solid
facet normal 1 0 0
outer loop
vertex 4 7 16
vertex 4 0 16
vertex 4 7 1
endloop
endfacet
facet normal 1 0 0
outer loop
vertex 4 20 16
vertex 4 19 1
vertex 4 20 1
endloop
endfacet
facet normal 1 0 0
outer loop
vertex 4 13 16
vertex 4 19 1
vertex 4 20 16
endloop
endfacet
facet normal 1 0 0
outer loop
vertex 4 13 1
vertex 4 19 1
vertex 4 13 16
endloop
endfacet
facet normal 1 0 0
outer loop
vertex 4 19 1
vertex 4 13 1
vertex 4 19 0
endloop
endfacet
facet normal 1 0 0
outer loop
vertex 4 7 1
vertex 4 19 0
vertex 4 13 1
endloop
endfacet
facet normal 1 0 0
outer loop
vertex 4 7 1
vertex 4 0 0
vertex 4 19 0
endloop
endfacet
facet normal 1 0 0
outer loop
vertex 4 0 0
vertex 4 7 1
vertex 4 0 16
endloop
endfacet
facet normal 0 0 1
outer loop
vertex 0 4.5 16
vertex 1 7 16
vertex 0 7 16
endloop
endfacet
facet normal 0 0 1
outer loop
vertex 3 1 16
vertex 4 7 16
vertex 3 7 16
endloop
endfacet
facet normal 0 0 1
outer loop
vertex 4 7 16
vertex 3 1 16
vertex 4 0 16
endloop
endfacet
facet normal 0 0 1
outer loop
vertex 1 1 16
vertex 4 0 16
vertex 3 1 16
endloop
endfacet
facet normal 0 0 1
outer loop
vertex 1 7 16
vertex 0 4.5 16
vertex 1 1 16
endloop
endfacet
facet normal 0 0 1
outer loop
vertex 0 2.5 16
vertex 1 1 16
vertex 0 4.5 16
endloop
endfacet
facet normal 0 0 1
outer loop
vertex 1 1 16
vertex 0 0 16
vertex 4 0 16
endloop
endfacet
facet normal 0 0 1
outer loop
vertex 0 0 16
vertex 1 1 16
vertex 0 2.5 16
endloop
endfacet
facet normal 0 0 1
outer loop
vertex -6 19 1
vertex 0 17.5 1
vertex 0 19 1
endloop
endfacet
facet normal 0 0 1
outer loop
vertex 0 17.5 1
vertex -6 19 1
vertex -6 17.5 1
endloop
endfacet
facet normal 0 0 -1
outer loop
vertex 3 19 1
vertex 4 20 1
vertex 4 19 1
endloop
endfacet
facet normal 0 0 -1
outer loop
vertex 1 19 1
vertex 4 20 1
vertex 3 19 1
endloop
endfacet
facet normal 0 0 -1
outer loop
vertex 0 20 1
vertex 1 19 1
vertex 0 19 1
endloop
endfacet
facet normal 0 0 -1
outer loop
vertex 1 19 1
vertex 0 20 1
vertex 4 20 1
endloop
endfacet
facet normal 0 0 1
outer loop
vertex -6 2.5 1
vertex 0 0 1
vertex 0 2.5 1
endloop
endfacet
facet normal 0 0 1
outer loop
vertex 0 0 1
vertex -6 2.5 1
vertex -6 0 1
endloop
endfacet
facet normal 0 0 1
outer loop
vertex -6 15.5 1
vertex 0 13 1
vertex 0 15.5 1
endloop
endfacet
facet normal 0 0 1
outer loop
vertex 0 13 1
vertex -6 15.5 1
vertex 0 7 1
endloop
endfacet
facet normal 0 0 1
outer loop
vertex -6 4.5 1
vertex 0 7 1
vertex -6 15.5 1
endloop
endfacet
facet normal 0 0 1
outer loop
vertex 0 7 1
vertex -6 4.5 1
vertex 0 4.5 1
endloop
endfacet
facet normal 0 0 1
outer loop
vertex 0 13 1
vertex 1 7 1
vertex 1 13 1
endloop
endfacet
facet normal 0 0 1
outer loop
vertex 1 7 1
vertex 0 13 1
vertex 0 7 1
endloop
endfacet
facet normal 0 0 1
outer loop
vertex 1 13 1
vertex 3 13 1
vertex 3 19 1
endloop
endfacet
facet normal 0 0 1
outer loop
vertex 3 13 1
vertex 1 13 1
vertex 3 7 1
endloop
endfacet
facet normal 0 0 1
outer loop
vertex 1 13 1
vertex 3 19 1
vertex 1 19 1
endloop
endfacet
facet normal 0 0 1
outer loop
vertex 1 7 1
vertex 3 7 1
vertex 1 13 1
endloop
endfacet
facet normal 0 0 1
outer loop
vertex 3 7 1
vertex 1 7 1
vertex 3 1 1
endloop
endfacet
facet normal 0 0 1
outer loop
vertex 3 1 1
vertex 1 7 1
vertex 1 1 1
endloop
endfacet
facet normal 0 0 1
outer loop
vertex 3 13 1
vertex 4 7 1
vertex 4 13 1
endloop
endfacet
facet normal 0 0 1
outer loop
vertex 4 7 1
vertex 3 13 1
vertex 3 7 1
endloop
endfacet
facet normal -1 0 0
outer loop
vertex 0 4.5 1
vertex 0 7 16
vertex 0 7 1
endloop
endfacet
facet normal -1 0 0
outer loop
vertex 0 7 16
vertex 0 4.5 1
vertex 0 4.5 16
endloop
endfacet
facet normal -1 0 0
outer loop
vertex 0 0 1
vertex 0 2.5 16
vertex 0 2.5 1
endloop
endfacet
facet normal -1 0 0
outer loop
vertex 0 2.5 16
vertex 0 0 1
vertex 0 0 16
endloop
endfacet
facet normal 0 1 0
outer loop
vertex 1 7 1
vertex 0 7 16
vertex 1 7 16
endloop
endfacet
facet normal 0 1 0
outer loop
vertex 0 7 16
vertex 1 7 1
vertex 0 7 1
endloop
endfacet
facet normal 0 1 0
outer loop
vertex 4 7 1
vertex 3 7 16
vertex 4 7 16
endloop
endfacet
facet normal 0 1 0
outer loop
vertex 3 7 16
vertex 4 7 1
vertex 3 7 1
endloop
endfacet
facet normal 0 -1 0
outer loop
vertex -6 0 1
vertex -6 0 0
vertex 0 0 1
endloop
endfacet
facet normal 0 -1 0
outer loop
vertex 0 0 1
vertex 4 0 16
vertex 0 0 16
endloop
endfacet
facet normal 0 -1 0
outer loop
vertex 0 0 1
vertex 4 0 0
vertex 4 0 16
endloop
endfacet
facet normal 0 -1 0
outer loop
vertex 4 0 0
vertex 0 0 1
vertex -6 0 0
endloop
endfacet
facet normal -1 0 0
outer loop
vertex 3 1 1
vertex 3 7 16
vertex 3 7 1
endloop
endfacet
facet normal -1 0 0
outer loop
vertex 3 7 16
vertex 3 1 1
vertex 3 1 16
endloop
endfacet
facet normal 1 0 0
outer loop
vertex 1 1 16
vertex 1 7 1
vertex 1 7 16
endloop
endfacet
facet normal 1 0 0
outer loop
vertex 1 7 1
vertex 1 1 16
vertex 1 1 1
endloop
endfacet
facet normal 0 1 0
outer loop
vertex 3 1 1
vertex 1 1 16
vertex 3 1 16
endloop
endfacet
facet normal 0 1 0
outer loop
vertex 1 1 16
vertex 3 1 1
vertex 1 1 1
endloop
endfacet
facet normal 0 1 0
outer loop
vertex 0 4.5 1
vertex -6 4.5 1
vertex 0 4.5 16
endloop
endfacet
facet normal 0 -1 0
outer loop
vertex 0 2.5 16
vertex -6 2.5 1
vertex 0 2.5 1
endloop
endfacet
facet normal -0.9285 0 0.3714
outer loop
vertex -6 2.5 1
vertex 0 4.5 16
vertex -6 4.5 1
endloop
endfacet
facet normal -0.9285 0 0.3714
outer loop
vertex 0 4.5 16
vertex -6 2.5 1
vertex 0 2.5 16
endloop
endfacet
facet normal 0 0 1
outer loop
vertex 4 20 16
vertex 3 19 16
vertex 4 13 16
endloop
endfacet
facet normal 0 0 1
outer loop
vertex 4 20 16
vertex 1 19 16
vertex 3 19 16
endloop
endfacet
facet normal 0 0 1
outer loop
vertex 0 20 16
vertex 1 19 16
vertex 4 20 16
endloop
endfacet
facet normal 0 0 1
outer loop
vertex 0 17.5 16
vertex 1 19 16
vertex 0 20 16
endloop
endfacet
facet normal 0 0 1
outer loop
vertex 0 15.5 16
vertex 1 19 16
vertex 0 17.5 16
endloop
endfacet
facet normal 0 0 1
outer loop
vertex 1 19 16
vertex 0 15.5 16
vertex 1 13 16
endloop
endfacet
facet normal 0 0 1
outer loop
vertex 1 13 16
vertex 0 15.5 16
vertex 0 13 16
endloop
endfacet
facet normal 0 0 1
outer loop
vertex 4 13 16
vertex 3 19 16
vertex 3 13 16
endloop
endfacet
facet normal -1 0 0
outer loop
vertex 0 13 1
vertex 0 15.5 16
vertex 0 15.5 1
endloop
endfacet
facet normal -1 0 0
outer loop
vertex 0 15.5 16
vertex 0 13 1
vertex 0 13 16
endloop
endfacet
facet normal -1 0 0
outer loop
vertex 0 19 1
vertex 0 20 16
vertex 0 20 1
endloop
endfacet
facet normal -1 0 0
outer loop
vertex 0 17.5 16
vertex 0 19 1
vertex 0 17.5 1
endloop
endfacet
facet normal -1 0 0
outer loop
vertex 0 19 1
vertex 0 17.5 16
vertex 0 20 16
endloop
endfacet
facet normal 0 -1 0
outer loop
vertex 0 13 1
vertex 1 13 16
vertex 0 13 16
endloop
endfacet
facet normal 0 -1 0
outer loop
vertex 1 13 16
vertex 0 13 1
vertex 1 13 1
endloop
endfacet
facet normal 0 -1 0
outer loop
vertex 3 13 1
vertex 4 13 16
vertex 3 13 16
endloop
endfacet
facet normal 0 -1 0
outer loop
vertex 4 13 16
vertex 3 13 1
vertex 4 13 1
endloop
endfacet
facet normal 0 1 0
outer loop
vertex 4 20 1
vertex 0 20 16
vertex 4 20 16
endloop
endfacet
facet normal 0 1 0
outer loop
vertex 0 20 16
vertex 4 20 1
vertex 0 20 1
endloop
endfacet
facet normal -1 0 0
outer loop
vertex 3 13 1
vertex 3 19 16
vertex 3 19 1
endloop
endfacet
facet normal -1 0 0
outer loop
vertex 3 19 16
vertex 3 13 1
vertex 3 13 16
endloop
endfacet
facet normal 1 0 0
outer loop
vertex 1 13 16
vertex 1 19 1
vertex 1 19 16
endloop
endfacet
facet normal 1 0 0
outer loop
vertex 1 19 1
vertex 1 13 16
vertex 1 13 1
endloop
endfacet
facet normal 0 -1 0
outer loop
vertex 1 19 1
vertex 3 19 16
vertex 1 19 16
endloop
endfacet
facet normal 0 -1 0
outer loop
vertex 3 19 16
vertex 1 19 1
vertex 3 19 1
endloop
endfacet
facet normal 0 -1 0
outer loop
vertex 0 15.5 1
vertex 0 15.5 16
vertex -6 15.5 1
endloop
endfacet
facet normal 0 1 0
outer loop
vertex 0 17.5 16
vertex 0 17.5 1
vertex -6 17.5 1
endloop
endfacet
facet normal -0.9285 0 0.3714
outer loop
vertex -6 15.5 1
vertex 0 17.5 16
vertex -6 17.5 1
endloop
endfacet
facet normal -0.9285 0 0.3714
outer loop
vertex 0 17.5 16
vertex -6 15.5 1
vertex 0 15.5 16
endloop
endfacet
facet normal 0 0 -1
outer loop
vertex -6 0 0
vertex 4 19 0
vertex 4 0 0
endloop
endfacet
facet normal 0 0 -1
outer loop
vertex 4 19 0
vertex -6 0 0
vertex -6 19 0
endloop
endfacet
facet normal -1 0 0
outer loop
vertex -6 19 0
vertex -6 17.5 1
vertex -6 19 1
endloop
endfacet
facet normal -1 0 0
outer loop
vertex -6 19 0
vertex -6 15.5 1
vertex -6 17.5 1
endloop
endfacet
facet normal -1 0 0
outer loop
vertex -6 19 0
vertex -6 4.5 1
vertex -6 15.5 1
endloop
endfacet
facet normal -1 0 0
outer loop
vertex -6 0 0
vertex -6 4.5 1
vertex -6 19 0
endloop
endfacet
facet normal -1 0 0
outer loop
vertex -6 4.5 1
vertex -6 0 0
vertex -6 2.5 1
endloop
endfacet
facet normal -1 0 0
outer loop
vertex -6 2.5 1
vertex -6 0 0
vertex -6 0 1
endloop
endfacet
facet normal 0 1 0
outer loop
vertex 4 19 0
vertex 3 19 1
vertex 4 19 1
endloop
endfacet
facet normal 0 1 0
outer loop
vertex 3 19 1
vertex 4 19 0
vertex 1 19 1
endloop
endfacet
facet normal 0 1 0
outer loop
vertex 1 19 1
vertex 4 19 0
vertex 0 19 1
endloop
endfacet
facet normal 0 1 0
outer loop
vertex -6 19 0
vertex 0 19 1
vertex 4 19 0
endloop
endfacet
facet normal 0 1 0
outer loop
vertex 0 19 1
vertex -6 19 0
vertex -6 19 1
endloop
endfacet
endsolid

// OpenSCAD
button_holder(
    button_width = 7,
    slot_depth = 6,
    slot_width = 2,
    slot_wall_width = 1,
    height = 15,
    base_thickness = 1,
    base_width = 10
);

module button_holder(
    button_width,
    slot_depth,
    slot_width,
    slot_wall_width,
    height,
    base_thickness,
    base_width
) {
    slot_size = button_width + slot_depth * 2;

    slot_sup_len = base_width - (slot_width + 2);

    translate([-slot_sup_len, 0, 0])
        cube([base_width, slot_size, base_thickness]);

    translate([0, 0, base_thickness]) {
        tslot(
            slot_width = slot_width,
            slot_depth = slot_depth,
            slot_height = height,
            slot_wall_width = slot_wall_width,
            support_base_length = slot_sup_len
        );

        translate([0, 20, 0]) {
            mirror([0, 1, 0]) {
                tslot(
                    slot_width = slot_width,
                    slot_depth = slot_depth,
                    slot_height = height,
                    slot_wall_width = slot_wall_width,
                    support_base_length = slot_sup_len
                );
            }
        }
    }
}

module tslot(
    slot_width,
    slot_depth,
    slot_height,
    slot_wall_width,
    support_base_length,
    use_sup = true
) {

    support_width = 2;

    difference() {
        cube([slot_width + slot_wall_width * 2, slot_depth + slot_wall_width, slot_height]);

        translate([slot_wall_width, slot_wall_width, -.5])
            cube([slot_width, slot_depth + 1, slot_height + 1]);
    }

    if (use_sup) {
        translate([0, support_width/2 + (slot_depth + slot_wall_width)/2, 0]) {
            rotate([0, -90, 90]) {
                linear_extrude(support_width) {
                    polygon([[0, 0], [0, support_base_length], [slot_height, 0]]);
                }
            }
        }
    }
}
